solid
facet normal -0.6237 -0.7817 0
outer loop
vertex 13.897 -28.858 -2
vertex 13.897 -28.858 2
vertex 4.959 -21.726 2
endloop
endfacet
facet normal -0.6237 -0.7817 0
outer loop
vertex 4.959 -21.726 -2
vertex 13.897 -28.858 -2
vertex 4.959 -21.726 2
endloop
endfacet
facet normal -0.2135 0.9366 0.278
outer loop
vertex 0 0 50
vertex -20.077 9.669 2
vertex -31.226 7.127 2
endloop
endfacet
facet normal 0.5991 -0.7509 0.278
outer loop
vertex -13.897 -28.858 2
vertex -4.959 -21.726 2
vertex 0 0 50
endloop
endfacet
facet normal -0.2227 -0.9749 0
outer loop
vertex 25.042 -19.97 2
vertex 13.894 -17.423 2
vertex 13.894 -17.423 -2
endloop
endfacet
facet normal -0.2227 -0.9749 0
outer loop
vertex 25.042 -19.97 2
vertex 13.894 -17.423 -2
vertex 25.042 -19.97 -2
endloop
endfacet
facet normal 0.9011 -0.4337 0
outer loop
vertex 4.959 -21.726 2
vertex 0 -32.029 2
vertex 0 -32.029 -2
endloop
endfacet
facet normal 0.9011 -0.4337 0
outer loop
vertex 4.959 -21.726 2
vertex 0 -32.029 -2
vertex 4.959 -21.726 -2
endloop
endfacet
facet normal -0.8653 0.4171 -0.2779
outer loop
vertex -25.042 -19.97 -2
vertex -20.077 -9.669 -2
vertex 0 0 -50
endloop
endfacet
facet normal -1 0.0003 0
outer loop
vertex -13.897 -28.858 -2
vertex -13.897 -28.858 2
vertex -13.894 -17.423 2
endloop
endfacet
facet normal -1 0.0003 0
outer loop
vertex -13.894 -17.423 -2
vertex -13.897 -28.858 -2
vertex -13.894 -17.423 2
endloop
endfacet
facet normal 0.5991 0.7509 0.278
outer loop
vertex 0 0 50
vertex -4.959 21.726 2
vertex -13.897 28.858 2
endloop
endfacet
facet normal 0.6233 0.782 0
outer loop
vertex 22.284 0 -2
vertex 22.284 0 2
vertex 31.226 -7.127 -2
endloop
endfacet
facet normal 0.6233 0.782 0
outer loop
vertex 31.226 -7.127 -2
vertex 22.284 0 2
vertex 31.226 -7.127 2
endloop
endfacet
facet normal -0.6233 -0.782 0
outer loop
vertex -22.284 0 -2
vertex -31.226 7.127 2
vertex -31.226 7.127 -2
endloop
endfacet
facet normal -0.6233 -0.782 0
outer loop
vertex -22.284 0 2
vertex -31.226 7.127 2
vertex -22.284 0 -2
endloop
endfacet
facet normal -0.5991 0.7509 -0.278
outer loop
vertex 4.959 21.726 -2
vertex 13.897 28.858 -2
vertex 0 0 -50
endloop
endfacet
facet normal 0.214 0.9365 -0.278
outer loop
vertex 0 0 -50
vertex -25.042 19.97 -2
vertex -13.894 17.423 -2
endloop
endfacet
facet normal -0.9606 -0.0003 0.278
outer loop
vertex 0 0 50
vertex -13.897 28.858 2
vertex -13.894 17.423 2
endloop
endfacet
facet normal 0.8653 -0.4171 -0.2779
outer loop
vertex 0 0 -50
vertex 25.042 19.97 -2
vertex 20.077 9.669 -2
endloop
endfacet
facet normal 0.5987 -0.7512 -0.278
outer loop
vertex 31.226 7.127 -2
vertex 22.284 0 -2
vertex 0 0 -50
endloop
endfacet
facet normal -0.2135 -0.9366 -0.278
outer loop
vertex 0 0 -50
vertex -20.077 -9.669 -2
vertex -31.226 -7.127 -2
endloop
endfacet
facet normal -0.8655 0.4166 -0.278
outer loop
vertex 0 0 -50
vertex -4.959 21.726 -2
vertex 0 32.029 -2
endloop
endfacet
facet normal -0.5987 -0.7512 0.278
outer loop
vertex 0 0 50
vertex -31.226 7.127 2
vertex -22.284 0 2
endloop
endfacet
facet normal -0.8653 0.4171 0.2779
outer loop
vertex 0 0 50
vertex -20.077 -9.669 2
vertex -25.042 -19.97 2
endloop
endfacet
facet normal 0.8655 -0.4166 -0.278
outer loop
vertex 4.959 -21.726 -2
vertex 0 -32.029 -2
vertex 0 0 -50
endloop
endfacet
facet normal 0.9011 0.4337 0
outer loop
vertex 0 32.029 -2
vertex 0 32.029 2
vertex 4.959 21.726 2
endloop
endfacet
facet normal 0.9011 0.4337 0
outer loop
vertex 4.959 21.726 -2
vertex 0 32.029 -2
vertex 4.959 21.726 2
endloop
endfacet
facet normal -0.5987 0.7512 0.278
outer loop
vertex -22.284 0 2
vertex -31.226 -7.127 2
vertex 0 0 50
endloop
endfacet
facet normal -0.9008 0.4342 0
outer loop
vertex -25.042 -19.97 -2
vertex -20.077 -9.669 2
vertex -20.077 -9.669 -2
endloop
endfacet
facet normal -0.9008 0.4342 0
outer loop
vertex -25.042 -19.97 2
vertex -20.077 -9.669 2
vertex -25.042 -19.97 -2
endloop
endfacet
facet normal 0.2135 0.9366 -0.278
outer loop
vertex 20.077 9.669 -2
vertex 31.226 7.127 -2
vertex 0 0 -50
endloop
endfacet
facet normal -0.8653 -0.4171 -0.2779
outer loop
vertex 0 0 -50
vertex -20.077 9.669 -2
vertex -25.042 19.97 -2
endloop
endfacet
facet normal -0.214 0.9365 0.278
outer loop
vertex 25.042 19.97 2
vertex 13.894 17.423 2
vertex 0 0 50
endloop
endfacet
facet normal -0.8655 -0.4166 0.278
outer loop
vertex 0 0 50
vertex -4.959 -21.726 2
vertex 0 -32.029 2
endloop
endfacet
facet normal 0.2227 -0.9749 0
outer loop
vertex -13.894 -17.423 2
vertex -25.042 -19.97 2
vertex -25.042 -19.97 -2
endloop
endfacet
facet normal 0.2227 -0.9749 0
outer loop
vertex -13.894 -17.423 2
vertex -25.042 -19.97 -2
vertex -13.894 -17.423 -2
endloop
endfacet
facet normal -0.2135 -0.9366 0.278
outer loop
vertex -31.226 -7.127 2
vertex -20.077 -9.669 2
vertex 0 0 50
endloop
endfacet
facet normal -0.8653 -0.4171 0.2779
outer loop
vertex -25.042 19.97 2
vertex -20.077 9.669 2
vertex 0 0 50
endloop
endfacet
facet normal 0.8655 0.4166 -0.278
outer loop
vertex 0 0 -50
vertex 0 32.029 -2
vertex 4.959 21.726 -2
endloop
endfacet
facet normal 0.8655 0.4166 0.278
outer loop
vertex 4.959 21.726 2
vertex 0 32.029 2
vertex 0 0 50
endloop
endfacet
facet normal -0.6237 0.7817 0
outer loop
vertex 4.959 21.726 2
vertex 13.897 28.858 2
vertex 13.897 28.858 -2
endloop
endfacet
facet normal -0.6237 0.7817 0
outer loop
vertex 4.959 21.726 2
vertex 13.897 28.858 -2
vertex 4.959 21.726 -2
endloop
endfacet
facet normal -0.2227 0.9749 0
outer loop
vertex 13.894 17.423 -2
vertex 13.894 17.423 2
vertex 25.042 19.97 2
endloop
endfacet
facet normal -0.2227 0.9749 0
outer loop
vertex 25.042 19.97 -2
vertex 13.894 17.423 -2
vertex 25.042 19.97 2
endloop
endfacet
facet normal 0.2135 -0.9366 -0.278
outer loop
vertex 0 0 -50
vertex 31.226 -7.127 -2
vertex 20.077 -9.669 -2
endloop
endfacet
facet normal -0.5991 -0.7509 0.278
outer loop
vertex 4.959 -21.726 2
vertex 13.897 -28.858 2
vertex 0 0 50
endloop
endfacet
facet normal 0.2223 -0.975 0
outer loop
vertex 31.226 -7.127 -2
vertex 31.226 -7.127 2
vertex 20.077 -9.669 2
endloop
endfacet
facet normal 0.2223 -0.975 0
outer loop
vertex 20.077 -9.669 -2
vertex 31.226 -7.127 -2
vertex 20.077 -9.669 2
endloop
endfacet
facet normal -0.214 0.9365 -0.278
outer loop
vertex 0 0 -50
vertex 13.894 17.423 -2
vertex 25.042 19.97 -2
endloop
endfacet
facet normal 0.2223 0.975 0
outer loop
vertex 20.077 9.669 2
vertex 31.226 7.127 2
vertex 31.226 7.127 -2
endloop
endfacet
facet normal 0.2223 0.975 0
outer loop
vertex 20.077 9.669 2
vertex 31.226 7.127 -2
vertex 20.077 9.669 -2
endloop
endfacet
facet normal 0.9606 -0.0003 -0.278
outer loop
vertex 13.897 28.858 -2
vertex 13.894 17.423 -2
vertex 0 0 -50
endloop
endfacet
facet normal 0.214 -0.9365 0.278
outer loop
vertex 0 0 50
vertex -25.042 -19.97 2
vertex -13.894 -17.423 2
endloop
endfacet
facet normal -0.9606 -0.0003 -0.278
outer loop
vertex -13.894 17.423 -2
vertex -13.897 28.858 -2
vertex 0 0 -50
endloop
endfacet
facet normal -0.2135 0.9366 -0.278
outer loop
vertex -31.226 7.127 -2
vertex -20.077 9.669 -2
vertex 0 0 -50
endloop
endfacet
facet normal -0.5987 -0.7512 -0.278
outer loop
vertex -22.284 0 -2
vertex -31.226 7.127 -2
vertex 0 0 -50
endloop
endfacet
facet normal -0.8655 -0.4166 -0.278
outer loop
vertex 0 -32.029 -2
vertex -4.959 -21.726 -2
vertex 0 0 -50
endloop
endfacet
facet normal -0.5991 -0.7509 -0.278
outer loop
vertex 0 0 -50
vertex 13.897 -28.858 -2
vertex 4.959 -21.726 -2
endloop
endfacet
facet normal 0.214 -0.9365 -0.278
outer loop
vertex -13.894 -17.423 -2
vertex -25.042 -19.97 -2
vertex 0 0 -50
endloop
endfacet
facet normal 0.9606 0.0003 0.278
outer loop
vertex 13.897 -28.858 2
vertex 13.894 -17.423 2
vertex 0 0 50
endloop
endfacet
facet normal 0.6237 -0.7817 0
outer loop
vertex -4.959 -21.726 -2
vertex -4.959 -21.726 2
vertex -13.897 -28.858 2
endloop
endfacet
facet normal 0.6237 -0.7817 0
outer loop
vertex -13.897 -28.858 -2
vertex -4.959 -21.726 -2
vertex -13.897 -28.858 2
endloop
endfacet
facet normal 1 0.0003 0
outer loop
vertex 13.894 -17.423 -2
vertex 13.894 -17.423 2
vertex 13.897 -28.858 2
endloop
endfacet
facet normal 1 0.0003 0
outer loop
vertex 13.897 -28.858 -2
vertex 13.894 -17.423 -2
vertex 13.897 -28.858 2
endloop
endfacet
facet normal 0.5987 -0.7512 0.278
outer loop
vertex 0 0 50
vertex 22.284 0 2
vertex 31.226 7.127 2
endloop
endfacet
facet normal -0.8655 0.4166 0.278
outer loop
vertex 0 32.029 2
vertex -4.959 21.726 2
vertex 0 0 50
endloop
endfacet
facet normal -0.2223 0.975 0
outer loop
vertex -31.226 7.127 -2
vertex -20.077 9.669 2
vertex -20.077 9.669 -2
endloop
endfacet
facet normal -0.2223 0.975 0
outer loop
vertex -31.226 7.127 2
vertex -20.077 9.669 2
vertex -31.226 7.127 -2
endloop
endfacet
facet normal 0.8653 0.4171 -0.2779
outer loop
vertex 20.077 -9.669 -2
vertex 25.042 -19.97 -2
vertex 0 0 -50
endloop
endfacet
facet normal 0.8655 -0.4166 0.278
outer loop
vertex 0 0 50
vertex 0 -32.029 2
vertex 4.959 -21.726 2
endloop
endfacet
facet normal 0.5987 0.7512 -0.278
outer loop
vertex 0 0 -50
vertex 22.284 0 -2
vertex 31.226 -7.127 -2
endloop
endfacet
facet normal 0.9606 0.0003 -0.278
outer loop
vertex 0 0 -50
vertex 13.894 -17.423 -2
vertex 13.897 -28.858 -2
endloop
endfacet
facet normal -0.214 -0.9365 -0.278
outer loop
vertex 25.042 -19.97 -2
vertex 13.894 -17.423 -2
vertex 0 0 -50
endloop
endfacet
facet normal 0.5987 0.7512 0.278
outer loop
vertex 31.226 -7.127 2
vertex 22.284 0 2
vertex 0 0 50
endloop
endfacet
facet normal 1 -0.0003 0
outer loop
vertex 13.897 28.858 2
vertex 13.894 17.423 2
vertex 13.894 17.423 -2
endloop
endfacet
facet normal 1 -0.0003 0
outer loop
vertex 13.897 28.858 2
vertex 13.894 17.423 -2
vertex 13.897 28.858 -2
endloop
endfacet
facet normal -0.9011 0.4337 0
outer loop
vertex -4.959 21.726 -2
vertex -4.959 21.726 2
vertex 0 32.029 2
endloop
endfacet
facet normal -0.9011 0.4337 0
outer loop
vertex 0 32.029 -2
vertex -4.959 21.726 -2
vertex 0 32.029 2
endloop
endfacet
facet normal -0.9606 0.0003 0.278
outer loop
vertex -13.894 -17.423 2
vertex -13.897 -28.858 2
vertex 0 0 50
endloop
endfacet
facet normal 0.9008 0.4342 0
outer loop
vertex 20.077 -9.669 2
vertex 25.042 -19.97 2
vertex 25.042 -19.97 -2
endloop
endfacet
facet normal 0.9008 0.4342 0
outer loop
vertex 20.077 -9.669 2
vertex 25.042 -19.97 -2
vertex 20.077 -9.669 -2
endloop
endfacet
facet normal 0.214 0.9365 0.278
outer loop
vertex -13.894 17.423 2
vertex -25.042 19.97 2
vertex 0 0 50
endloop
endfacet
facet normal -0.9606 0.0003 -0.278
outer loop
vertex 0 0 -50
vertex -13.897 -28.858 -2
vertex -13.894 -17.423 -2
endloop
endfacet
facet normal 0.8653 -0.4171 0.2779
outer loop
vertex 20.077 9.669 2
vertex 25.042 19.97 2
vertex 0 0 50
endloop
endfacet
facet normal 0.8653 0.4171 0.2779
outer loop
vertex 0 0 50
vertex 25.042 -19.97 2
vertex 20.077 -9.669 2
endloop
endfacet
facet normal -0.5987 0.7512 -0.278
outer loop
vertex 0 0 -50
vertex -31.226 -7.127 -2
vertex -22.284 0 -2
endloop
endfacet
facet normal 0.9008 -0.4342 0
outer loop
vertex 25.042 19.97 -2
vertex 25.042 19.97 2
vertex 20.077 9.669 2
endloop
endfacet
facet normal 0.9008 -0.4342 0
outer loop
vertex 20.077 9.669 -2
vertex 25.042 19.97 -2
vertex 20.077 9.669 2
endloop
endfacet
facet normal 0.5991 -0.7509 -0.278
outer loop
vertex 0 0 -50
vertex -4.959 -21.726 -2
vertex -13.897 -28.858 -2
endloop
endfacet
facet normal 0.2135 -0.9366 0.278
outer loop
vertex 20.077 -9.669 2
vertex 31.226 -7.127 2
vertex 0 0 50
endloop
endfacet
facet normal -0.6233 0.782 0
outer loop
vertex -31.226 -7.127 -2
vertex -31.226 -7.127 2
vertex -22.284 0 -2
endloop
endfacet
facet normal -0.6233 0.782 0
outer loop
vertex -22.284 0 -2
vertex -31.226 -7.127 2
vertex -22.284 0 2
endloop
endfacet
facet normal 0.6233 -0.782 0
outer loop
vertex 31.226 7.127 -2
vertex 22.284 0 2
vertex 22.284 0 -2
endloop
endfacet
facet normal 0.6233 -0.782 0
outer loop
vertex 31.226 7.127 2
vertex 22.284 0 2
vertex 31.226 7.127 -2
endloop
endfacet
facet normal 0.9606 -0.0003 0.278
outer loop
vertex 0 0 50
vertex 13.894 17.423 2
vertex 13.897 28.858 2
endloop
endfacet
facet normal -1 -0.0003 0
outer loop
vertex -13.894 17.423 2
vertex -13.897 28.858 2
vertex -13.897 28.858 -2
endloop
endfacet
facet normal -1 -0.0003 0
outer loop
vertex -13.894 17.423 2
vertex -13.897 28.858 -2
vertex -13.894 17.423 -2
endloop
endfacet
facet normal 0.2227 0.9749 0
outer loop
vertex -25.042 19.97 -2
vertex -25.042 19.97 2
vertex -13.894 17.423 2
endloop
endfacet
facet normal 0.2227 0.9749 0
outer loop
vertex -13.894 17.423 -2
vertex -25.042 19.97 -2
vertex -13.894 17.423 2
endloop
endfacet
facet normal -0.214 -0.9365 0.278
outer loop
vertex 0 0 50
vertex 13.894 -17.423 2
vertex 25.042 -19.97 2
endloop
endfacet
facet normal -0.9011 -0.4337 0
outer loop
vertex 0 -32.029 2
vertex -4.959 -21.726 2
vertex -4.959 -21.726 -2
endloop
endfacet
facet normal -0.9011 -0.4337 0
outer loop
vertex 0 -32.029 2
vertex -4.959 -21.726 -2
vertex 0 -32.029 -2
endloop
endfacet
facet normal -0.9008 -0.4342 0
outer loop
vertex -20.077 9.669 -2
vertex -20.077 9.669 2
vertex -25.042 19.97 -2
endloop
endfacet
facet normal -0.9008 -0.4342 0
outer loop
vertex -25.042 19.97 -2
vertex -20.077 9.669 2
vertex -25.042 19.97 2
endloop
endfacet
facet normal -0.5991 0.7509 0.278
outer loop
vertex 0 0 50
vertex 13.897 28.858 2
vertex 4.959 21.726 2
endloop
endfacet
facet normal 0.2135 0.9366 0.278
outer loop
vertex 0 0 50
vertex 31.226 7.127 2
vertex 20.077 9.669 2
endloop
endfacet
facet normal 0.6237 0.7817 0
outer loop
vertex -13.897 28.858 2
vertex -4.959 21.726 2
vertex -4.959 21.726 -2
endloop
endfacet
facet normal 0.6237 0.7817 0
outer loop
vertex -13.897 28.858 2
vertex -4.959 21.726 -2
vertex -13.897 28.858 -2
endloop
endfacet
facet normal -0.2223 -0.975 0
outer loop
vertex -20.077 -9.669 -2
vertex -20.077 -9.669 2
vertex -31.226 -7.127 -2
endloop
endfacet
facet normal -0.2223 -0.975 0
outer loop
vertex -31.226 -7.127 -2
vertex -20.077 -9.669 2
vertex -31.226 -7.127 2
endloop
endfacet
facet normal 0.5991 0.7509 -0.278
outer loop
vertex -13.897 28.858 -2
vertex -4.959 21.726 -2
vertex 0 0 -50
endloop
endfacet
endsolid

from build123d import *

# Parameters (mm, degrees)
F2_DEPTH = 2


with BuildPart() as f2:
    # F0 (on Top) → F2 (new body)
    with BuildSketch(Plane.XY):
        Polygon((-13.892356, 11.078785), (-17.323485, -3.953972), (-7.709676, -16.009307), (7.709676, -16.009307), (17.323485, -3.953972), (13.892356, 11.078785), (0, 17.768991), (-13.897051, 28.857524), align=None)
        Polygon((17.323485, -3.953972), (7.709676, -16.009307), (25.041621, -19.970026), align=None)
        Polygon((13.892356, 11.078785), (17.323485, -3.953972), (31.226391, 7.12722), align=None)
        Polygon((7.709676, -16.009307), (-7.709676, -16.009307), (0, -32.029435), align=None)
        Polygon((-7.709676, -16.009307), (-17.323485, -3.953972), (-25.041621, -19.970026), align=None)
        Polygon((-31.226391, 7.12722), (-17.323485, -3.953972), (-13.892356, 11.078785), align=None)
        Polygon((13.897051, 28.857524), (0, 17.768991), (13.892356, 11.078785), align=None)
    extrude(amount=F2_DEPTH)

    # F2_face (on face) → F4 section 0
    with BuildSketch(Plane.XY.offset(2), mode=Mode.PRIVATE) as f4_s0:
        Polygon((0, 17.768991), (-13.897051, 28.857524), (-13.892356, 11.078785), (-31.226391, 7.12722), (-17.323485, -3.953972), (-25.041621, -19.970026), (-7.709676, -16.009307), (0, -32.029435), (7.709676, -16.009307), (25.041621, -19.970026), (17.323485, -3.953972), (31.226391, 7.12722), (13.892356, 11.078785), (13.897051, 28.857524), align=None)
    loft([Vertex(0, 0, 50), f4_s0.sketch])

    # F5: F2 across face


with BuildPart() as f2_1:
    add(f2.part)
    add(f2.part.mirror(Plane(origin=(0, 0, 0), x_dir=(1, 0, 0), z_dir=(0, 0, -1))))

    # F6: F2 across plane


with BuildPart() as f2_2:
    add(f2_1.part)
    add(f2_1.part.mirror(Plane.XZ))


solid = f2_2.part
